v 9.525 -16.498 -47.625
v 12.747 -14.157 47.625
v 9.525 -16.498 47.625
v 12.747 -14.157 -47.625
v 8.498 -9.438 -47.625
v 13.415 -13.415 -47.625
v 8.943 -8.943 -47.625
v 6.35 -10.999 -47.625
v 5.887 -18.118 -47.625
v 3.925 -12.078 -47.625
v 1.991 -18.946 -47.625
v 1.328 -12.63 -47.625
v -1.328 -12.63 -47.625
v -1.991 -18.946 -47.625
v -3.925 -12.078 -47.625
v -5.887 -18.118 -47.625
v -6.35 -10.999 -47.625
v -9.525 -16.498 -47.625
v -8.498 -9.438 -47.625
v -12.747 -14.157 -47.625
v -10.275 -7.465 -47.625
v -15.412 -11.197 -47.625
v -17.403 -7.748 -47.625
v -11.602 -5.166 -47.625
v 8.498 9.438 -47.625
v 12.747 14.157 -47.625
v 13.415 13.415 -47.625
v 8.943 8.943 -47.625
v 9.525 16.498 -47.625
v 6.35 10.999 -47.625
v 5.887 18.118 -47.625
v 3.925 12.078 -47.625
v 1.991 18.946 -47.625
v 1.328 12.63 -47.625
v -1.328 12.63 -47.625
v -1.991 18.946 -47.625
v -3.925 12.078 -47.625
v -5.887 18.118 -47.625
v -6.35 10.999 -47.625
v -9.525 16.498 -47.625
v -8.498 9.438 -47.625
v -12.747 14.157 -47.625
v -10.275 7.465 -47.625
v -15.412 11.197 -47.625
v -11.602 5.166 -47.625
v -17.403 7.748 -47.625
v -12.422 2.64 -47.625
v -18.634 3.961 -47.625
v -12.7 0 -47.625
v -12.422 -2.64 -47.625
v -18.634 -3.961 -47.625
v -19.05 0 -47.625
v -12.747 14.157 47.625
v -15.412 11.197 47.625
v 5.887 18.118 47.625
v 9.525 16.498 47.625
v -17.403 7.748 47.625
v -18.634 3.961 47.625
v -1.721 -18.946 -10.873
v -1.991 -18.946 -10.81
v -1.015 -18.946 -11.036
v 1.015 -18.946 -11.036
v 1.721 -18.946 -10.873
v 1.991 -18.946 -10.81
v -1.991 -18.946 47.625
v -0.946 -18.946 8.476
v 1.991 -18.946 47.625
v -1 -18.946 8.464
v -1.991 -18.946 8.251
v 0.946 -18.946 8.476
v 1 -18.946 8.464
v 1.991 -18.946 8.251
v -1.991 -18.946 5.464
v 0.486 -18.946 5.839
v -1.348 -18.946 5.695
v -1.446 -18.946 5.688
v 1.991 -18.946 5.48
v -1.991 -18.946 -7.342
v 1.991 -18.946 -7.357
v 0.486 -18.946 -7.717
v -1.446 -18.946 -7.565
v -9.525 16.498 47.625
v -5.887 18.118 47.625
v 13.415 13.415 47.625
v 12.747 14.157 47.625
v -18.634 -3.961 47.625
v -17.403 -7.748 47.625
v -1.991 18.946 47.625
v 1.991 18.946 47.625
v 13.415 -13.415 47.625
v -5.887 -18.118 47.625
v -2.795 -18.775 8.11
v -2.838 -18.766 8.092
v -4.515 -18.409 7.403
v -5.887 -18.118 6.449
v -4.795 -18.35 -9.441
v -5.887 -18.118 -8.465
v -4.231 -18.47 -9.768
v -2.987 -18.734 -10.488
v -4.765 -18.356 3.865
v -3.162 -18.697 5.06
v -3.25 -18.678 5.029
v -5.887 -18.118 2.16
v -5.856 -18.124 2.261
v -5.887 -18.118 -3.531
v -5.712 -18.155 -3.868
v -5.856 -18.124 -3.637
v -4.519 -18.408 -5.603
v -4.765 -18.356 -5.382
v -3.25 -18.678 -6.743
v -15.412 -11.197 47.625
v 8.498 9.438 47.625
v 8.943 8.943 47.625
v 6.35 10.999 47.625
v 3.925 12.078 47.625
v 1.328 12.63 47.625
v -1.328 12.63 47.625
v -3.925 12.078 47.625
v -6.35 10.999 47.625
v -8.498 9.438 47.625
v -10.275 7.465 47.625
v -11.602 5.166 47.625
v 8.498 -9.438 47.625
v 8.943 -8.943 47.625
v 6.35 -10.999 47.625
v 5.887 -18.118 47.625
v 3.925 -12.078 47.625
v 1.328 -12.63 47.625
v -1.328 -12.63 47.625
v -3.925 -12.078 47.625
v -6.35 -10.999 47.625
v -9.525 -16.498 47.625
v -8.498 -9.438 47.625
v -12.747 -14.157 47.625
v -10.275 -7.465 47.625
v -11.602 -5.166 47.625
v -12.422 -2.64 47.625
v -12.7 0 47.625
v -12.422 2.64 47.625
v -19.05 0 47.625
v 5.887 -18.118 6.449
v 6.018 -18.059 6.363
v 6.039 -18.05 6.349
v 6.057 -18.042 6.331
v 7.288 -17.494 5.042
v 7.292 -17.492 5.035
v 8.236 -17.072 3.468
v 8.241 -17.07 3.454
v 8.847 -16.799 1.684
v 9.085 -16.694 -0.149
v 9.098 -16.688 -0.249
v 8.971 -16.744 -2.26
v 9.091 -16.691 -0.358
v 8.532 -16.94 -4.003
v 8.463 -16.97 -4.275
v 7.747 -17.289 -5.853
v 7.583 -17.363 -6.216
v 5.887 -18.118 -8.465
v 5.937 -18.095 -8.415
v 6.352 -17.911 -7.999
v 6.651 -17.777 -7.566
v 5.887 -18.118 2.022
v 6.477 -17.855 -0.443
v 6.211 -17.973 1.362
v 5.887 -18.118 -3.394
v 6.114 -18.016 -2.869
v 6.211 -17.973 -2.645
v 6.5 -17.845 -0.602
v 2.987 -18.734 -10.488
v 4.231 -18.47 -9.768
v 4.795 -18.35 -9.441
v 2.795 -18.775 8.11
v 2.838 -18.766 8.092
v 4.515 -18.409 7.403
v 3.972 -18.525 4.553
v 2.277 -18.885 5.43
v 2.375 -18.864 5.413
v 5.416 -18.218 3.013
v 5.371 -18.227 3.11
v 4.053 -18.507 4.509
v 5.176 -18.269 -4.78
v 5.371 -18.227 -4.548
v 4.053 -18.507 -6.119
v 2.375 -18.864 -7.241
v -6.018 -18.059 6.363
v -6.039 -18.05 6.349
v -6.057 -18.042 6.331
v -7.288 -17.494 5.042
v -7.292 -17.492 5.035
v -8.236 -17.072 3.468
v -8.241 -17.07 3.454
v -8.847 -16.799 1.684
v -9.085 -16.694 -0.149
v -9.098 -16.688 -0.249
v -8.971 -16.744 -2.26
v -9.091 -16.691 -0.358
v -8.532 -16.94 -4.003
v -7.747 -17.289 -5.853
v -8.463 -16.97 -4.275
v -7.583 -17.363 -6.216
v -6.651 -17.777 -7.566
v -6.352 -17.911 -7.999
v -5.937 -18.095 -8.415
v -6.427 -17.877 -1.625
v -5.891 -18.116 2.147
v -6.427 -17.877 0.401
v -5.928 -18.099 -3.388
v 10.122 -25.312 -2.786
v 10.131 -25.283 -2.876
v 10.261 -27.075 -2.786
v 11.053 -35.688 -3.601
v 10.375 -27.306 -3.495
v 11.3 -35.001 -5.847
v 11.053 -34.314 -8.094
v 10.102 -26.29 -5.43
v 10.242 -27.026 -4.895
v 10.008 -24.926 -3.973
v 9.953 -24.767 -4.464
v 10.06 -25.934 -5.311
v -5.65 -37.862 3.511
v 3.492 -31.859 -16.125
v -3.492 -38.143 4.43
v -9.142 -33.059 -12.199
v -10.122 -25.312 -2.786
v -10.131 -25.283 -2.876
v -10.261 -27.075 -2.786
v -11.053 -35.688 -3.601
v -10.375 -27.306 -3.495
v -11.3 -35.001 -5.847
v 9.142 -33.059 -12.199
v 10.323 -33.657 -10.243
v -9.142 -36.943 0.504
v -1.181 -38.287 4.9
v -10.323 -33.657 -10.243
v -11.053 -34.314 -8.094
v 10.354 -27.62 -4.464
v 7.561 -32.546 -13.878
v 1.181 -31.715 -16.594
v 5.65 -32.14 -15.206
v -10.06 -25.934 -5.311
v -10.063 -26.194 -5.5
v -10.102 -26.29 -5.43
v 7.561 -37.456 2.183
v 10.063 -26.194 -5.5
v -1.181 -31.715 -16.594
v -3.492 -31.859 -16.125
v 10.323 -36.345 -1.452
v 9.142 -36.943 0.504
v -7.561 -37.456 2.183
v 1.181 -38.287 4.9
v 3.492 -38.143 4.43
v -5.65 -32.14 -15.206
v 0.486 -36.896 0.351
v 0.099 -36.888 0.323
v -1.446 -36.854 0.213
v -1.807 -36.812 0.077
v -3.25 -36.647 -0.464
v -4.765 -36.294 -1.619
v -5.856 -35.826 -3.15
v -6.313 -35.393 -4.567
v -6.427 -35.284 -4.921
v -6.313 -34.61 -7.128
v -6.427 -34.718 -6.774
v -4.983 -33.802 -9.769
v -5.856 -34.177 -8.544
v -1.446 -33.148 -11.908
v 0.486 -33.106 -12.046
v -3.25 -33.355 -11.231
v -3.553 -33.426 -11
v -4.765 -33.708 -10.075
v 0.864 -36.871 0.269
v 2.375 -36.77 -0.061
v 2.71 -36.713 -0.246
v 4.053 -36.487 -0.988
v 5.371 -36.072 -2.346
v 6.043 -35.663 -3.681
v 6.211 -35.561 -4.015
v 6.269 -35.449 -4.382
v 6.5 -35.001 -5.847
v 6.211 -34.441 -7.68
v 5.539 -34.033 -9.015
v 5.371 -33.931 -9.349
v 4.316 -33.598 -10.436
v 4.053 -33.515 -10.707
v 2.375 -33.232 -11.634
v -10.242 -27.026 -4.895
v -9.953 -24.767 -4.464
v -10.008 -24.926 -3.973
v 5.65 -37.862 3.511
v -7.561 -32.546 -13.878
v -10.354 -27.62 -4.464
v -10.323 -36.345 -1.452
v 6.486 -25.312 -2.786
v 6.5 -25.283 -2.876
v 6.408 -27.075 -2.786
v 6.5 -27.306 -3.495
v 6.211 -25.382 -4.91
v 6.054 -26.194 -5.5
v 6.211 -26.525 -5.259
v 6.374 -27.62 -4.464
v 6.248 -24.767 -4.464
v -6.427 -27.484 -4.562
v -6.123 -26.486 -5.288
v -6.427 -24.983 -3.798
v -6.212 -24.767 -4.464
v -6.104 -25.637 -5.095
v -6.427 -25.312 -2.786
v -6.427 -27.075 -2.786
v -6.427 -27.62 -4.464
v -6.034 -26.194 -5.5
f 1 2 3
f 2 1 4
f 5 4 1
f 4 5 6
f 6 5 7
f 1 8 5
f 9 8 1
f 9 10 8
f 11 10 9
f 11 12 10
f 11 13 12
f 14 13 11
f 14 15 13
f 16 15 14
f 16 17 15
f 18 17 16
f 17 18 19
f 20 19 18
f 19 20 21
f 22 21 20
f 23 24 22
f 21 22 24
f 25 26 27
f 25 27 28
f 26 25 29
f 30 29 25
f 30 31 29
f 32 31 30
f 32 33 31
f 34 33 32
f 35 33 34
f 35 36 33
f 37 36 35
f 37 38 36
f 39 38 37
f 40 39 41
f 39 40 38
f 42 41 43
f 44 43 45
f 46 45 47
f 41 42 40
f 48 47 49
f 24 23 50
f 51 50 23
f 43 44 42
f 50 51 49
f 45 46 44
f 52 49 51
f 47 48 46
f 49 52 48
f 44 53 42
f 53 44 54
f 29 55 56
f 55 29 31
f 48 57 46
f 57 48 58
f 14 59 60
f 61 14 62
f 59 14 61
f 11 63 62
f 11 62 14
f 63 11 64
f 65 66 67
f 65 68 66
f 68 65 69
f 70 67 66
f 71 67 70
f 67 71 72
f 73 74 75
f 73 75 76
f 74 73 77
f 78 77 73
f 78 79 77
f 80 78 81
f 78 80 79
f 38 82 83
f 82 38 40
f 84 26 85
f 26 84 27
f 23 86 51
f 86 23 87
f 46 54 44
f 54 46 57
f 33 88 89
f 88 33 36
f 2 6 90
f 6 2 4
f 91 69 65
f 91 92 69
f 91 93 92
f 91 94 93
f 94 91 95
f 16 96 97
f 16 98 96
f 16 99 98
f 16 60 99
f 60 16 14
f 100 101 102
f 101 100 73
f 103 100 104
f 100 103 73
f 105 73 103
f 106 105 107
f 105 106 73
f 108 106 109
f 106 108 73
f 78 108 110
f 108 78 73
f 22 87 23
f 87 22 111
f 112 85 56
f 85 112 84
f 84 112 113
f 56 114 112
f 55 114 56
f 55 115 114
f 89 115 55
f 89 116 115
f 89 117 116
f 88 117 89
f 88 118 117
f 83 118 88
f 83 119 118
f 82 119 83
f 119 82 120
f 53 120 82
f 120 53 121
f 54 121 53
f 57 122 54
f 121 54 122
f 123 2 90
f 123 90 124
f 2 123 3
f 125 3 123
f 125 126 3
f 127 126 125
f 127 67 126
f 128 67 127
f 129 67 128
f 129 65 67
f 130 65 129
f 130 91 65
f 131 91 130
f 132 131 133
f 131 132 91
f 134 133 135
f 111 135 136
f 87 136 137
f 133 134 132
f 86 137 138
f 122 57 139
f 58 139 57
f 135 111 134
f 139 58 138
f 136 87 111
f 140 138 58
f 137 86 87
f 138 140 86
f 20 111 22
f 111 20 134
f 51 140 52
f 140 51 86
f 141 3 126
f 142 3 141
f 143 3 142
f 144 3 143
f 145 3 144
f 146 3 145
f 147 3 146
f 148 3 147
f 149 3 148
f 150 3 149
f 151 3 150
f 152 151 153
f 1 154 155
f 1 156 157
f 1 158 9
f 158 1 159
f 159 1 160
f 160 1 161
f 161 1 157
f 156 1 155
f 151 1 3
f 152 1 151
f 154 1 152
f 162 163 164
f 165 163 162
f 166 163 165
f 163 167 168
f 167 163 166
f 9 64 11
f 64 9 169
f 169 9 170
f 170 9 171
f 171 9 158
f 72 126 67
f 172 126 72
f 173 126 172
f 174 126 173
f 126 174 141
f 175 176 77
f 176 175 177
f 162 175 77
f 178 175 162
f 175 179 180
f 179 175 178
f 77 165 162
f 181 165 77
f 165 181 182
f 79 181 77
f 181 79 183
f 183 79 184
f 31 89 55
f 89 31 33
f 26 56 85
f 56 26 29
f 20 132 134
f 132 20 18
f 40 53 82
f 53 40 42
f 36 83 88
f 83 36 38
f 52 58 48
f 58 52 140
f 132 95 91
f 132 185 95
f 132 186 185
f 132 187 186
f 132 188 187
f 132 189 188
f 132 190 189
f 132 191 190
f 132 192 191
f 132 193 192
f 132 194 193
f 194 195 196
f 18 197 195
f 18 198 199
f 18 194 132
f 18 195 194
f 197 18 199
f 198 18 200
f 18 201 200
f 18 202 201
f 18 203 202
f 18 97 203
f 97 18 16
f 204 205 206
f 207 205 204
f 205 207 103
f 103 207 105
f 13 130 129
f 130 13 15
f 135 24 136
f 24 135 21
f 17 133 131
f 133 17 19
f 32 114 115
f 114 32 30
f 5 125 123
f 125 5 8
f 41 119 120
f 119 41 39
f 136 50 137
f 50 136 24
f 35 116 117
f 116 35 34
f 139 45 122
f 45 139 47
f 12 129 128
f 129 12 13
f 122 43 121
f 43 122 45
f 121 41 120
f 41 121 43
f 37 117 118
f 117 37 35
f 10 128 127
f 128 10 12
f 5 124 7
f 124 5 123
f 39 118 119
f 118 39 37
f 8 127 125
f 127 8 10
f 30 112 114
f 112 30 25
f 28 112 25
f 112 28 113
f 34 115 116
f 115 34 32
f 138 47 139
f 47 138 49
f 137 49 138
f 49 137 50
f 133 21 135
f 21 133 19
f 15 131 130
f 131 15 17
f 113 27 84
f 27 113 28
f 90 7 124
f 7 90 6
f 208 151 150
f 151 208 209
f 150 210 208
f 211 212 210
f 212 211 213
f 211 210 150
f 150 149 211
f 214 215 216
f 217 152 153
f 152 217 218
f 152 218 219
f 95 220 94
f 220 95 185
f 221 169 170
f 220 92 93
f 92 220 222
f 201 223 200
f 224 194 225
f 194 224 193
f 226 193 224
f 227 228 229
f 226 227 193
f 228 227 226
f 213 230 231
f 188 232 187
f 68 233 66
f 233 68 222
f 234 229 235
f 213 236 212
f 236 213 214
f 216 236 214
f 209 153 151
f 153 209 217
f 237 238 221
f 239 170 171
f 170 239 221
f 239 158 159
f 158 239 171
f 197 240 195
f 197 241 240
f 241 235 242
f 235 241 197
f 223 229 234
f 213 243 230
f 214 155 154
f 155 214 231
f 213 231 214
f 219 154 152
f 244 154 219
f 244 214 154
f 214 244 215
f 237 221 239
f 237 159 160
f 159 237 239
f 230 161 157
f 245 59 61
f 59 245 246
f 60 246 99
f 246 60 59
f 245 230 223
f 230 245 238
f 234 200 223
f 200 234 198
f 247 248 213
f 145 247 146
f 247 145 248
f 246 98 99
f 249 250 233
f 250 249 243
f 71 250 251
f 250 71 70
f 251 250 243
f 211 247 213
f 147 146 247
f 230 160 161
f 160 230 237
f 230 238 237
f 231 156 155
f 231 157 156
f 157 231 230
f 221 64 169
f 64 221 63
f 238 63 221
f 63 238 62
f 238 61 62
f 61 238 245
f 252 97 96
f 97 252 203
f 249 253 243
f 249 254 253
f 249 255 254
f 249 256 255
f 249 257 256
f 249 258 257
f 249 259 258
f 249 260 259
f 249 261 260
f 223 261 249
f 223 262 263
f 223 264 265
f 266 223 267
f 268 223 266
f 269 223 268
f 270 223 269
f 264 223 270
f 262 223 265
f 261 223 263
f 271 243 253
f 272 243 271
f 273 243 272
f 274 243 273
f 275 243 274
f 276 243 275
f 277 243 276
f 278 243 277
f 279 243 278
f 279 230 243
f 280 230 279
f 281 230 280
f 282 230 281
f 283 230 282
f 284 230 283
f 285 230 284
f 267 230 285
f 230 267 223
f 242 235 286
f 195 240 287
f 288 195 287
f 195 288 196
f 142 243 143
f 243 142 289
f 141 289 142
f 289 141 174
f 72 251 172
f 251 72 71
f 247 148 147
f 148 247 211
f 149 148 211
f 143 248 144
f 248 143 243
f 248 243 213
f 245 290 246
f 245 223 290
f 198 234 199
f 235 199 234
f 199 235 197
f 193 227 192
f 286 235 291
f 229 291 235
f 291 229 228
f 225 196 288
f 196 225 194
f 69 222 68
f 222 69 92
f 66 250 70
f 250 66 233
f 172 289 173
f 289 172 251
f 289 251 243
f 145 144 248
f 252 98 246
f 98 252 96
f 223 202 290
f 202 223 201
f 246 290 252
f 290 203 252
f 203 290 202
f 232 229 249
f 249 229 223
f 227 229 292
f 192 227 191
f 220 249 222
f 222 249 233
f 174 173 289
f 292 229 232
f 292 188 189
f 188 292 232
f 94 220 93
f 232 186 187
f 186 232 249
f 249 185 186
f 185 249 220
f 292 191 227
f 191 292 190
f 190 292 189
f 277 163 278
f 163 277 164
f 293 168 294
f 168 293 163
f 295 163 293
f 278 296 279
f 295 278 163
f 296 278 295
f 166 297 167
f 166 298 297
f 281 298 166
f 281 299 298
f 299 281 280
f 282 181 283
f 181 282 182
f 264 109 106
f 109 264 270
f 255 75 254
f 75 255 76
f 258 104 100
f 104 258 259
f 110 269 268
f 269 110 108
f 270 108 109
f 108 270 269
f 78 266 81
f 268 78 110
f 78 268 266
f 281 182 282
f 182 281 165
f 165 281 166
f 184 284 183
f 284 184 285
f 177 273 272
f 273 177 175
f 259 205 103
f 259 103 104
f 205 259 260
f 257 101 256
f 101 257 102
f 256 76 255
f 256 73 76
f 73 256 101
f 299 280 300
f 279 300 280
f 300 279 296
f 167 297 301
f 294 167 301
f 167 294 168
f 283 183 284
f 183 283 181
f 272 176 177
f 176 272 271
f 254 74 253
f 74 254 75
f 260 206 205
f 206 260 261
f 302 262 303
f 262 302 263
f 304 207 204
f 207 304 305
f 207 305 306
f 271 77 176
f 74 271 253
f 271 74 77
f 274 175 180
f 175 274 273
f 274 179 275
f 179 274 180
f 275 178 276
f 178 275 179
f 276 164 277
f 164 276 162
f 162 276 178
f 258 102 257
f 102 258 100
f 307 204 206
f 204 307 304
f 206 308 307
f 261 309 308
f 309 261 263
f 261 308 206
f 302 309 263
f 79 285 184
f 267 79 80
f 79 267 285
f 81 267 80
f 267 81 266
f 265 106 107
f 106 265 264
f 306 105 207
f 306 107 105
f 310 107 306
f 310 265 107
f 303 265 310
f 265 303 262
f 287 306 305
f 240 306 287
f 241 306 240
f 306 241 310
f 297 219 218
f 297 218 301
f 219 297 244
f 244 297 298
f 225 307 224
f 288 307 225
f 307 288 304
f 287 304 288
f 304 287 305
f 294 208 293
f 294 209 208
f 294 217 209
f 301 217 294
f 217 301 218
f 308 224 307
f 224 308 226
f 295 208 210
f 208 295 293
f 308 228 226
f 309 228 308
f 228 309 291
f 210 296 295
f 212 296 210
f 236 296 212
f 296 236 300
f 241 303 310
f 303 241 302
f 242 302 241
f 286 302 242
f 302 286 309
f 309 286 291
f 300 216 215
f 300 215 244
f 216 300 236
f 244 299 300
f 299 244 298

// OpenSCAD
// - Bat Diameter (mm) (default=25.4)
batdia = 25.4; // [20:35]
// - Handle Length (mm) (default=95.25)
handlelength = 95.25; // [70:110]
// - Wall Thickness (mm) (default=6.35)
wallthickness = 6.35; // [6.35:8]

module outerdia (){
cylinder(h=handlelength,r= (batdia/2)+wallthickness, center=true);
}
module innerdia (){
cylinder(h= handlelength,r= batdia/2, center=true);
}
module batslot(){
 translate([0,0,-handlelength/2])
 rotate([0,0,-45])
 cube([(batdia+wallthickness),(batdia+wallthickness),handlelength]);
}  
module rubberstub (){
translate ([0,-(batdia/2)-(wallthickness/2),0])
rotate([107,0,0])
cylinder(h=20,r1=9,r2=11.3);
}
module rubbercb (){
translate ([0,-(batdia/2)-(wallthickness/2),0])
rotate([107,0,0])
cylinder(h=25,r1=6.5,r2=6.5);
}
module bolthole (){
translate ([-15,-(batdia/2)-(wallthickness*2.125),-4])
rotate([0,90,0])
cylinder(h=30,r1=1.5,r2=1.5);
}
union(){
difference (){
    outerdia();
    innerdia();
    batslot();
}
difference (){
rubberstub();
    rubbercb();
    bolthole();
}
}
